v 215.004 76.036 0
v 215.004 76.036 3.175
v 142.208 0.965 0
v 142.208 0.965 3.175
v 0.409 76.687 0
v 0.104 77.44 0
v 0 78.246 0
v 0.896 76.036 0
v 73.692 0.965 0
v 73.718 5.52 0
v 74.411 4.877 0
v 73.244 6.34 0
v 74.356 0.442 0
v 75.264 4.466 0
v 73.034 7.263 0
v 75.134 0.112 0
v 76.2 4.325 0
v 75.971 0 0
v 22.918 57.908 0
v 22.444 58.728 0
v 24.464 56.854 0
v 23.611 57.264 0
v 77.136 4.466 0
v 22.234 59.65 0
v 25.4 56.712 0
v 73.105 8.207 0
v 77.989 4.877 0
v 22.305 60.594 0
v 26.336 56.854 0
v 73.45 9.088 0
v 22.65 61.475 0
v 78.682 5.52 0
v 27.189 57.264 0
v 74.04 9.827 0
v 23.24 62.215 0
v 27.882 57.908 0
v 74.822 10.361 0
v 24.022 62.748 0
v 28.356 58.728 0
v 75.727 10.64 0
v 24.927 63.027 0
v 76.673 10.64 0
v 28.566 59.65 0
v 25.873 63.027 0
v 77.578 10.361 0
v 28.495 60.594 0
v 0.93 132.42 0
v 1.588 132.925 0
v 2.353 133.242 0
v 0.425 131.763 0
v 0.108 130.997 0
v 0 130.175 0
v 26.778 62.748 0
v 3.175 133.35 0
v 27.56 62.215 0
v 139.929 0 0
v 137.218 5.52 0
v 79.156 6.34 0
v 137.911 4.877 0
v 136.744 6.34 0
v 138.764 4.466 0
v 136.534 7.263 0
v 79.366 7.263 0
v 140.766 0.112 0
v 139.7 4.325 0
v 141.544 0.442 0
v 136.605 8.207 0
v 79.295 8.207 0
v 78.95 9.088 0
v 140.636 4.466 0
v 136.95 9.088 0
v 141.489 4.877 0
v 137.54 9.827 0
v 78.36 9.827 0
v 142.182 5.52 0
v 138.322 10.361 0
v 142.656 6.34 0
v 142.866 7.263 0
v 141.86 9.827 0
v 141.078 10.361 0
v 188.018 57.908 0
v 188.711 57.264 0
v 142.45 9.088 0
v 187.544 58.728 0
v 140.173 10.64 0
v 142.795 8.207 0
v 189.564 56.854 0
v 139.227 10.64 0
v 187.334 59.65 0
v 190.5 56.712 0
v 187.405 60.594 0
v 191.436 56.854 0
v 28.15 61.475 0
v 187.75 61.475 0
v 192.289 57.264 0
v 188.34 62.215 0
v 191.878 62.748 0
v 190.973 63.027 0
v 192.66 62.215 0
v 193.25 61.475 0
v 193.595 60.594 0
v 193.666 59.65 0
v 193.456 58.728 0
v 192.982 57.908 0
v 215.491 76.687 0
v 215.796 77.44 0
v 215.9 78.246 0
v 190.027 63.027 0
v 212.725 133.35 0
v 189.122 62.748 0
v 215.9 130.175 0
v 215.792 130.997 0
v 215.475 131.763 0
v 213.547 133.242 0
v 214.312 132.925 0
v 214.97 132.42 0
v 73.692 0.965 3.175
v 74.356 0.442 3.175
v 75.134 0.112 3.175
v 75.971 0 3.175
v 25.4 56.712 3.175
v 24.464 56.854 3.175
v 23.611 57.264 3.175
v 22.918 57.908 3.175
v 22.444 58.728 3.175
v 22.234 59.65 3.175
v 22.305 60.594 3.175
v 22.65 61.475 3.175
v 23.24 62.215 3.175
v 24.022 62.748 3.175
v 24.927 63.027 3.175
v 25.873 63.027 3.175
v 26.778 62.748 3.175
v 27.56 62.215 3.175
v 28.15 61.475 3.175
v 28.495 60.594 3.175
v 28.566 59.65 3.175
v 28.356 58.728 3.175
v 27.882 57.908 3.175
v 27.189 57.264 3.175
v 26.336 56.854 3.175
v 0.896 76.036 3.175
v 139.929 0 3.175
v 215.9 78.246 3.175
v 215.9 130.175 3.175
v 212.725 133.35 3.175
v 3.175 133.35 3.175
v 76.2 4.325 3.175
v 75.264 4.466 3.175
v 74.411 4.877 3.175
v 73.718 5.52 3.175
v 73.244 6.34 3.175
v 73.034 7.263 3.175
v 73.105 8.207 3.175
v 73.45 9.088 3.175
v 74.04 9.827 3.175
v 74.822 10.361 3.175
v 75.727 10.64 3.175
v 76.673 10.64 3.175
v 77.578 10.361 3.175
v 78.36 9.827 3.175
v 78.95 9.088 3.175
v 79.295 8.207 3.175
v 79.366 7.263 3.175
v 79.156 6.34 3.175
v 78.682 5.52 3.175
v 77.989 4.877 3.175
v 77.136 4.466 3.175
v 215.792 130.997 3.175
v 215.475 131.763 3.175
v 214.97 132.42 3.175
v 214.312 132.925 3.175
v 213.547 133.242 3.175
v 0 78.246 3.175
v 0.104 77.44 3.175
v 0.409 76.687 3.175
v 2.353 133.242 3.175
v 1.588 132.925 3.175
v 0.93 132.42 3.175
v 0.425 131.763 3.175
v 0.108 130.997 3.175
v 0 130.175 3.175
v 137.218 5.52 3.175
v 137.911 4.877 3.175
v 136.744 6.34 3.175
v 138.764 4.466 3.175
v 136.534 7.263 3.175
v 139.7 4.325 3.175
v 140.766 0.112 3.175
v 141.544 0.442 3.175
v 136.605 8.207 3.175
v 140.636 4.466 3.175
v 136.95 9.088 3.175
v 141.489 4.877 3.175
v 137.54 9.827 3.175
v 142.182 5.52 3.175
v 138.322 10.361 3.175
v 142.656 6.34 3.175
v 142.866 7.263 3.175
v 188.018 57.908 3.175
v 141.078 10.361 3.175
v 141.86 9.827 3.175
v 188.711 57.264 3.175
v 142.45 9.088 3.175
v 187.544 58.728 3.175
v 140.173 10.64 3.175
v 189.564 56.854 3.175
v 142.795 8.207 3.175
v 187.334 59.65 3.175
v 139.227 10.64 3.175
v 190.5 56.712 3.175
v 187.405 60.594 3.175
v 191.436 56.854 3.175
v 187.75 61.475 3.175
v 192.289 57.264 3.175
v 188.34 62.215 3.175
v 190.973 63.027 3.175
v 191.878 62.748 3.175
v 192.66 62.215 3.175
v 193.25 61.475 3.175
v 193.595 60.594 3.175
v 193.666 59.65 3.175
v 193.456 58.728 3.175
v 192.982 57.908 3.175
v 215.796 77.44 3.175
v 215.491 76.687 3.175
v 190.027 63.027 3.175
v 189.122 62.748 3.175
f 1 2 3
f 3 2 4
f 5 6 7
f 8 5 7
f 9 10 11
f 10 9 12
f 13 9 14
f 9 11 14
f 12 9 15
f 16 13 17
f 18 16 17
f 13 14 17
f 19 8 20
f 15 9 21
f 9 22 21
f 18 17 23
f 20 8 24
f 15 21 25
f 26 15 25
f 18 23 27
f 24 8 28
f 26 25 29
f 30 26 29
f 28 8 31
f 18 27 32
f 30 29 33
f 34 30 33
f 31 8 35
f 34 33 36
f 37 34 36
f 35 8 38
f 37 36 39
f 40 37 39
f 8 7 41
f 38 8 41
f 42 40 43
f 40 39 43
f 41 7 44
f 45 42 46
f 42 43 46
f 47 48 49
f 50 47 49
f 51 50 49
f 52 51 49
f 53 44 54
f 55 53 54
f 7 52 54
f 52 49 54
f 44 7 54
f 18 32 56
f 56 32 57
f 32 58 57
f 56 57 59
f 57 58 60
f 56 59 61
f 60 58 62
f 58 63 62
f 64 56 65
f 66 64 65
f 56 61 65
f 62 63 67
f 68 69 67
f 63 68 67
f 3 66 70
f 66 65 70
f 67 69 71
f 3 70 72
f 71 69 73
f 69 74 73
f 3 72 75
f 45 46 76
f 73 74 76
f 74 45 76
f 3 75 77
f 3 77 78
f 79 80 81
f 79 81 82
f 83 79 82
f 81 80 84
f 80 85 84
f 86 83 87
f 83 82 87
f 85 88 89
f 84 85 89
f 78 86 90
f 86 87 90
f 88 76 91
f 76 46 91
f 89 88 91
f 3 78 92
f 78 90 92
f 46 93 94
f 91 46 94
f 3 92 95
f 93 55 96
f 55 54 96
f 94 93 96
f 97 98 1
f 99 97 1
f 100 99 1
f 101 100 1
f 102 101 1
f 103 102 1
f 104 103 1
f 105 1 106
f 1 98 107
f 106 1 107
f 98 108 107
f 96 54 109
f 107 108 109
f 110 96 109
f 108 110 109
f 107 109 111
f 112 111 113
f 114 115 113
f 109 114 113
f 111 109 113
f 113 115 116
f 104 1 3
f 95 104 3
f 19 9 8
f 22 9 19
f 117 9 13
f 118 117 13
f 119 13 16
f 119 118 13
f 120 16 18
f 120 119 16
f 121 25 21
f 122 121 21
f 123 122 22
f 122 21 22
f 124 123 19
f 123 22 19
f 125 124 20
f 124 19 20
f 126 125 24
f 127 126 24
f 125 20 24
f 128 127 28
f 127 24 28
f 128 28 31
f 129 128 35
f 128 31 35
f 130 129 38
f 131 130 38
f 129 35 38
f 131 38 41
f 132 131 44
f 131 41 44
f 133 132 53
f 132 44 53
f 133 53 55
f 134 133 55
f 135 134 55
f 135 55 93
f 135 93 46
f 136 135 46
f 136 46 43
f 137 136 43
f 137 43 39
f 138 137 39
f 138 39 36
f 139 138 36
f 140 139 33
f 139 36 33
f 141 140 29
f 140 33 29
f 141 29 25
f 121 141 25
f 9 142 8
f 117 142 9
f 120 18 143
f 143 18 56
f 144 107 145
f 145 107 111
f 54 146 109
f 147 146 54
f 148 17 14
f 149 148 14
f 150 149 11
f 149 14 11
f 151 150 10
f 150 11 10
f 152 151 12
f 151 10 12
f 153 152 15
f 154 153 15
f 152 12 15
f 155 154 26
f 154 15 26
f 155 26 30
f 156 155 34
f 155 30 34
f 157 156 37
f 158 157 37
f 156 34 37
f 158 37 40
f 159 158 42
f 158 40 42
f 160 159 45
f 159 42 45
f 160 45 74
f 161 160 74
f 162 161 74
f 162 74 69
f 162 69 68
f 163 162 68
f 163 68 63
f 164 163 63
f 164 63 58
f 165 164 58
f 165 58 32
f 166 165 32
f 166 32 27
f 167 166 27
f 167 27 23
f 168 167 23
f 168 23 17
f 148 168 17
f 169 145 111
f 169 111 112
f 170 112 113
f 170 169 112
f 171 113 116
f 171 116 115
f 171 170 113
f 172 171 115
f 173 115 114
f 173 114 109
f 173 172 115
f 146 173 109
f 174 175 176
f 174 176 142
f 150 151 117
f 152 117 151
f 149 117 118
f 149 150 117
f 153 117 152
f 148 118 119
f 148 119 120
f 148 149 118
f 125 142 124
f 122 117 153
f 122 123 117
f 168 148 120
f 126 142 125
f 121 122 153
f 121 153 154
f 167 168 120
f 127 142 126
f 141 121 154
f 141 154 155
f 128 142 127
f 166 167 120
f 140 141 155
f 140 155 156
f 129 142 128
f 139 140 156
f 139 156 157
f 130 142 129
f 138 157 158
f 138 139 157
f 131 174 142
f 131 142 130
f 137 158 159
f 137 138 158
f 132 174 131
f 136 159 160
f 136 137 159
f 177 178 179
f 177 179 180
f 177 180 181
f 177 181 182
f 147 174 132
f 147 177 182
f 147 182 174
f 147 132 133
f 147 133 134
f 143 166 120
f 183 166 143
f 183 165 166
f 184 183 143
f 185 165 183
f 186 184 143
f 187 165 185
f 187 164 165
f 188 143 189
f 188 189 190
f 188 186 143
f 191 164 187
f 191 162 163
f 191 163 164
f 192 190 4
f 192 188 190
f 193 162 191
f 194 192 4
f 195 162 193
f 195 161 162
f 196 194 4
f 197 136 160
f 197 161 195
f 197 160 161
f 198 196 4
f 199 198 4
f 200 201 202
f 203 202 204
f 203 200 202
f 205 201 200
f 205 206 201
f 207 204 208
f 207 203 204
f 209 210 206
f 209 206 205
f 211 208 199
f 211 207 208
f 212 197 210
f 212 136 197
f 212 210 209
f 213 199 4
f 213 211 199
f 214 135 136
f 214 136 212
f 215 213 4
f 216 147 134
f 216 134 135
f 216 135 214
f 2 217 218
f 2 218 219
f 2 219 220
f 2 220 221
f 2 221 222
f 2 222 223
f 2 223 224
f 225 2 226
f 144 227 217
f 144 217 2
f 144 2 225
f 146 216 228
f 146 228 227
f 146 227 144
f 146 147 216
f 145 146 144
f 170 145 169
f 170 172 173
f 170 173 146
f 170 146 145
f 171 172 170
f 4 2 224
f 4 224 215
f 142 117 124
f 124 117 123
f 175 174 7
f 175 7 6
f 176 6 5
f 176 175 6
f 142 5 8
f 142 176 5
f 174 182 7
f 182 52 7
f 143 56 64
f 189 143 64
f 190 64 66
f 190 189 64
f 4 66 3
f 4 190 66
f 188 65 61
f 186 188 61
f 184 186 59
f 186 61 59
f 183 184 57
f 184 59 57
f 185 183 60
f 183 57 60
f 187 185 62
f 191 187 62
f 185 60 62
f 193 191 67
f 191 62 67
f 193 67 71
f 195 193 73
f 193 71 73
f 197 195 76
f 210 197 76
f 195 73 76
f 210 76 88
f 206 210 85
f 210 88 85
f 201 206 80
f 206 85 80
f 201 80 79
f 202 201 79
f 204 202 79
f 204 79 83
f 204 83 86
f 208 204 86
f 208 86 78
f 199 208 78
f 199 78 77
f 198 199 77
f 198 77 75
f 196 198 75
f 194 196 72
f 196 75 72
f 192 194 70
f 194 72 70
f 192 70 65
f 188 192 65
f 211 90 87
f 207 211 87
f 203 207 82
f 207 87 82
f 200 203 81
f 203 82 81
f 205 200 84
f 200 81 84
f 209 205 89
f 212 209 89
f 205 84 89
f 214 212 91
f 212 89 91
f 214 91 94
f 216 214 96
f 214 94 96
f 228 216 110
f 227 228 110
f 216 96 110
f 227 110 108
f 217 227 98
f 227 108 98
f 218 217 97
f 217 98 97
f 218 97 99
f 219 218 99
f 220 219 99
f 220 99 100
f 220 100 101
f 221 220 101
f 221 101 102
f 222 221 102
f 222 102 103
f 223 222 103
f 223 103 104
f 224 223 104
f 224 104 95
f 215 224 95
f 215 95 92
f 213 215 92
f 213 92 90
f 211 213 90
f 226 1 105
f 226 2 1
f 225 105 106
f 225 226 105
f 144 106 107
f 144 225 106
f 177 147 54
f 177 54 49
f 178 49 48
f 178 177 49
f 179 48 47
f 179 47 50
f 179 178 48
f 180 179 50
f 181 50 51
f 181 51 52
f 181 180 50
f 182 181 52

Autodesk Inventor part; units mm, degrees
ref_plane "YZ Plane" through (0, 0, 0) normal (1, 0, 0) x (0, 1, 0)
ref_plane "XZ Plane" through (0, 0, 0) normal (0, 1, 0) x (-1, 0, 0)
ref_plane "XY Plane" through (0, 0, 0) normal (0, 0, 1) x (1, 0, 0)
sketch "Sketch1" plane through (0, 0, 0) normal (0, 0, 1) x (1, 0, 0)
  line L0 (0, 0) -> (215.9, 0)
  line L1 (215.9, 0) -> (215.9, 152.4)
  line L2 (215.9, 152.4) -> (0, 152.4)
  line L3 (0, 152.4) -> (0, 0)
  dimension "d0" = 215.9
  dimension "d1" = 152.4
extrude "Extrusion1" add sketch "Sketch1" along normal blind 3.175
sketch "Sketch2" plane through (0, 0, 3.175) normal (0, 0, 1) x (1, 0, 0)
  line L0 (215.9, 152.4) -> (0, 152.4) construction
  line L1 (107.95, 152.4) -> (107.95, 0) construction
  line L2 (0, 0) -> (215.9, 0) projected
  point P0 (25.4, 59.8875)
  point P1 (76.2, 7.5)
  point P2 (190.5, 59.8875)
  point P3 (139.7, 7.5)
  dimension "d5" = 31.75
  dimension "d7" = 82.55
  dimension "d9" = 52.3875
  dimension "d10" = 7.5
hole "Hole1" at (25.4, 59.8875, 3.175) at (76.2, 7.5, 3.175) at (190.5, 59.8875, 3.175) at (139.7, 7.5, 3.175) direction (0, 0, -1) diameter 6.35 end through all
sketch "Sketch3" plane through (0, 0, 3.175) normal (0, 0, 1) x (1, 0, 0)
  line L0 (215.9, 152.4) -> (0, 152.4) projected
  line L1 (107.95, 152.4) -> (107.95, 0)
  line L2 (0, 0) -> (215.9, 0) projected
  circle A0 centre (25.4, 59.8875) radius 3.175 projected
  circle A1 centre (76.2, 7.5) radius 3.175 projected
  line L3 (25.4, 59.8875) -> (76.2, 7.5) construction
  line L4 (0.8957, 76.0359) -> (73.692, 0.9647)
  line L5 (0, 152.4) -> (0, 0) projected
  line L6 (0, 130.175) -> (0, 78.2462)
  line L7 (3.175, 133.35) -> (107.95, 133.35)
  line L8 (0, 133.35) -> (0, 125.3708)
  circle A2 centre (190.5, 59.8875) radius 3.175
  circle A3 centre (139.7, 7.5) radius 3.175
  line L9 (190.5, 59.8875) -> (139.7, 7.5) construction
  line L10 (215.0043, 76.0359) -> (142.208, 0.9647)
  line L11 (215.9, 152.4) -> (215.9, 78.2462)
  line L12 (215.9, 133.35) -> (215.9, 76.9596)
  line L13 (212.725, 133.35) -> (107.95, 133.35)
  line L14 (215.9, 130.175) -> (215.9, 125.3708)
  arc A4 (3.175, 133.35) -> (0, 130.175) centre (3.175, 130.175) ccw
  arc A5 (0, 78.2462) -> (0.8957, 76.0359) centre (3.175, 78.2462) ccw
  line L15 (75.9713, 0) -> (107.95, 0)
  line L16 (139.9287, 0) -> (107.95, 0)
  arc A6 (73.692, 0.9647) -> (75.9713, 0) centre (75.9713, 3.175) ccw
  arc A7 (139.9287, 0) -> (142.208, 0.9647) centre (139.9287, 3.175) ccw
  arc A8 (215.0043, 76.0359) -> (215.9, 78.2462) centre (212.725, 78.2462) ccw
  arc A9 (215.9, 130.175) -> (212.725, 133.35) centre (212.725, 130.175) ccw
  line L17 (215.9, 0) -> (215.9, 152.4) projected
  point P0 (74.6275, 0)
  point P1 (0, 76.9596)
  point P2 (77.9849, 0)
  dimension "d19" = 6.35
  dimension "d20" = 19.05
  dimension "d21" = 3.175
  dimension "d22" = 3.175
  dimension "d23" = 3.175
  dimension "d27" = 31.9787
  dimension "d28" = 31.9787
extrude "Extrusion2" cut sketch "Sketch3" against normal blind 3.175 contours L11 A9 L13 L1 L0 | L1 L7 A4 L5 L0 | L2 L5 A5 L4 A6 | A7 L10 A8 L12 L17 L2
sketch "Sketch4" plane through (0, 0, 3.175) normal (0, 0, 1) x (1, 0, 0)
  circle A0 centre (76.2059, 20.2) radius 3.175
  circle A1 centre (76.2, 7.5) radius 3.175 projected
  line L0 (73.0309, 20.2015) -> (73.0254, 7.4505)
  circle A2 centre (76.2, 7.5) radius 3.175 projected
  line L1 (79.3809, 20.2) -> (79.375, 7.4971)
  line L2 (3.175, 133.35) -> (212.725, 133.35) projected
  line L3 (107.95, 133.35) -> (107.95, 0) construction
  line L4 (75.9713, 0) -> (139.9287, 0) projected
  circle A3 centre (139.6941, 20.2) radius 3.175
  line L5 (142.8691, 20.2015) -> (142.8746, 7.4505)
  line L6 (136.5191, 20.2) -> (136.525, 7.5)
  circle A4 centre (76.2, 7.5) radius 3.175
  circle A5 centre (139.7, 7.5) radius 3.175 projected
  circle A6 centre (139.7, 7.5) radius 3.175
  point P0 (0, 0)
  point P1 (136.525, 7.4971)
  dimension "d29" = 6.35
  dimension "d30" = 12.7
equation "\"d28\" = d27"
properties part number "new pulley plate"
